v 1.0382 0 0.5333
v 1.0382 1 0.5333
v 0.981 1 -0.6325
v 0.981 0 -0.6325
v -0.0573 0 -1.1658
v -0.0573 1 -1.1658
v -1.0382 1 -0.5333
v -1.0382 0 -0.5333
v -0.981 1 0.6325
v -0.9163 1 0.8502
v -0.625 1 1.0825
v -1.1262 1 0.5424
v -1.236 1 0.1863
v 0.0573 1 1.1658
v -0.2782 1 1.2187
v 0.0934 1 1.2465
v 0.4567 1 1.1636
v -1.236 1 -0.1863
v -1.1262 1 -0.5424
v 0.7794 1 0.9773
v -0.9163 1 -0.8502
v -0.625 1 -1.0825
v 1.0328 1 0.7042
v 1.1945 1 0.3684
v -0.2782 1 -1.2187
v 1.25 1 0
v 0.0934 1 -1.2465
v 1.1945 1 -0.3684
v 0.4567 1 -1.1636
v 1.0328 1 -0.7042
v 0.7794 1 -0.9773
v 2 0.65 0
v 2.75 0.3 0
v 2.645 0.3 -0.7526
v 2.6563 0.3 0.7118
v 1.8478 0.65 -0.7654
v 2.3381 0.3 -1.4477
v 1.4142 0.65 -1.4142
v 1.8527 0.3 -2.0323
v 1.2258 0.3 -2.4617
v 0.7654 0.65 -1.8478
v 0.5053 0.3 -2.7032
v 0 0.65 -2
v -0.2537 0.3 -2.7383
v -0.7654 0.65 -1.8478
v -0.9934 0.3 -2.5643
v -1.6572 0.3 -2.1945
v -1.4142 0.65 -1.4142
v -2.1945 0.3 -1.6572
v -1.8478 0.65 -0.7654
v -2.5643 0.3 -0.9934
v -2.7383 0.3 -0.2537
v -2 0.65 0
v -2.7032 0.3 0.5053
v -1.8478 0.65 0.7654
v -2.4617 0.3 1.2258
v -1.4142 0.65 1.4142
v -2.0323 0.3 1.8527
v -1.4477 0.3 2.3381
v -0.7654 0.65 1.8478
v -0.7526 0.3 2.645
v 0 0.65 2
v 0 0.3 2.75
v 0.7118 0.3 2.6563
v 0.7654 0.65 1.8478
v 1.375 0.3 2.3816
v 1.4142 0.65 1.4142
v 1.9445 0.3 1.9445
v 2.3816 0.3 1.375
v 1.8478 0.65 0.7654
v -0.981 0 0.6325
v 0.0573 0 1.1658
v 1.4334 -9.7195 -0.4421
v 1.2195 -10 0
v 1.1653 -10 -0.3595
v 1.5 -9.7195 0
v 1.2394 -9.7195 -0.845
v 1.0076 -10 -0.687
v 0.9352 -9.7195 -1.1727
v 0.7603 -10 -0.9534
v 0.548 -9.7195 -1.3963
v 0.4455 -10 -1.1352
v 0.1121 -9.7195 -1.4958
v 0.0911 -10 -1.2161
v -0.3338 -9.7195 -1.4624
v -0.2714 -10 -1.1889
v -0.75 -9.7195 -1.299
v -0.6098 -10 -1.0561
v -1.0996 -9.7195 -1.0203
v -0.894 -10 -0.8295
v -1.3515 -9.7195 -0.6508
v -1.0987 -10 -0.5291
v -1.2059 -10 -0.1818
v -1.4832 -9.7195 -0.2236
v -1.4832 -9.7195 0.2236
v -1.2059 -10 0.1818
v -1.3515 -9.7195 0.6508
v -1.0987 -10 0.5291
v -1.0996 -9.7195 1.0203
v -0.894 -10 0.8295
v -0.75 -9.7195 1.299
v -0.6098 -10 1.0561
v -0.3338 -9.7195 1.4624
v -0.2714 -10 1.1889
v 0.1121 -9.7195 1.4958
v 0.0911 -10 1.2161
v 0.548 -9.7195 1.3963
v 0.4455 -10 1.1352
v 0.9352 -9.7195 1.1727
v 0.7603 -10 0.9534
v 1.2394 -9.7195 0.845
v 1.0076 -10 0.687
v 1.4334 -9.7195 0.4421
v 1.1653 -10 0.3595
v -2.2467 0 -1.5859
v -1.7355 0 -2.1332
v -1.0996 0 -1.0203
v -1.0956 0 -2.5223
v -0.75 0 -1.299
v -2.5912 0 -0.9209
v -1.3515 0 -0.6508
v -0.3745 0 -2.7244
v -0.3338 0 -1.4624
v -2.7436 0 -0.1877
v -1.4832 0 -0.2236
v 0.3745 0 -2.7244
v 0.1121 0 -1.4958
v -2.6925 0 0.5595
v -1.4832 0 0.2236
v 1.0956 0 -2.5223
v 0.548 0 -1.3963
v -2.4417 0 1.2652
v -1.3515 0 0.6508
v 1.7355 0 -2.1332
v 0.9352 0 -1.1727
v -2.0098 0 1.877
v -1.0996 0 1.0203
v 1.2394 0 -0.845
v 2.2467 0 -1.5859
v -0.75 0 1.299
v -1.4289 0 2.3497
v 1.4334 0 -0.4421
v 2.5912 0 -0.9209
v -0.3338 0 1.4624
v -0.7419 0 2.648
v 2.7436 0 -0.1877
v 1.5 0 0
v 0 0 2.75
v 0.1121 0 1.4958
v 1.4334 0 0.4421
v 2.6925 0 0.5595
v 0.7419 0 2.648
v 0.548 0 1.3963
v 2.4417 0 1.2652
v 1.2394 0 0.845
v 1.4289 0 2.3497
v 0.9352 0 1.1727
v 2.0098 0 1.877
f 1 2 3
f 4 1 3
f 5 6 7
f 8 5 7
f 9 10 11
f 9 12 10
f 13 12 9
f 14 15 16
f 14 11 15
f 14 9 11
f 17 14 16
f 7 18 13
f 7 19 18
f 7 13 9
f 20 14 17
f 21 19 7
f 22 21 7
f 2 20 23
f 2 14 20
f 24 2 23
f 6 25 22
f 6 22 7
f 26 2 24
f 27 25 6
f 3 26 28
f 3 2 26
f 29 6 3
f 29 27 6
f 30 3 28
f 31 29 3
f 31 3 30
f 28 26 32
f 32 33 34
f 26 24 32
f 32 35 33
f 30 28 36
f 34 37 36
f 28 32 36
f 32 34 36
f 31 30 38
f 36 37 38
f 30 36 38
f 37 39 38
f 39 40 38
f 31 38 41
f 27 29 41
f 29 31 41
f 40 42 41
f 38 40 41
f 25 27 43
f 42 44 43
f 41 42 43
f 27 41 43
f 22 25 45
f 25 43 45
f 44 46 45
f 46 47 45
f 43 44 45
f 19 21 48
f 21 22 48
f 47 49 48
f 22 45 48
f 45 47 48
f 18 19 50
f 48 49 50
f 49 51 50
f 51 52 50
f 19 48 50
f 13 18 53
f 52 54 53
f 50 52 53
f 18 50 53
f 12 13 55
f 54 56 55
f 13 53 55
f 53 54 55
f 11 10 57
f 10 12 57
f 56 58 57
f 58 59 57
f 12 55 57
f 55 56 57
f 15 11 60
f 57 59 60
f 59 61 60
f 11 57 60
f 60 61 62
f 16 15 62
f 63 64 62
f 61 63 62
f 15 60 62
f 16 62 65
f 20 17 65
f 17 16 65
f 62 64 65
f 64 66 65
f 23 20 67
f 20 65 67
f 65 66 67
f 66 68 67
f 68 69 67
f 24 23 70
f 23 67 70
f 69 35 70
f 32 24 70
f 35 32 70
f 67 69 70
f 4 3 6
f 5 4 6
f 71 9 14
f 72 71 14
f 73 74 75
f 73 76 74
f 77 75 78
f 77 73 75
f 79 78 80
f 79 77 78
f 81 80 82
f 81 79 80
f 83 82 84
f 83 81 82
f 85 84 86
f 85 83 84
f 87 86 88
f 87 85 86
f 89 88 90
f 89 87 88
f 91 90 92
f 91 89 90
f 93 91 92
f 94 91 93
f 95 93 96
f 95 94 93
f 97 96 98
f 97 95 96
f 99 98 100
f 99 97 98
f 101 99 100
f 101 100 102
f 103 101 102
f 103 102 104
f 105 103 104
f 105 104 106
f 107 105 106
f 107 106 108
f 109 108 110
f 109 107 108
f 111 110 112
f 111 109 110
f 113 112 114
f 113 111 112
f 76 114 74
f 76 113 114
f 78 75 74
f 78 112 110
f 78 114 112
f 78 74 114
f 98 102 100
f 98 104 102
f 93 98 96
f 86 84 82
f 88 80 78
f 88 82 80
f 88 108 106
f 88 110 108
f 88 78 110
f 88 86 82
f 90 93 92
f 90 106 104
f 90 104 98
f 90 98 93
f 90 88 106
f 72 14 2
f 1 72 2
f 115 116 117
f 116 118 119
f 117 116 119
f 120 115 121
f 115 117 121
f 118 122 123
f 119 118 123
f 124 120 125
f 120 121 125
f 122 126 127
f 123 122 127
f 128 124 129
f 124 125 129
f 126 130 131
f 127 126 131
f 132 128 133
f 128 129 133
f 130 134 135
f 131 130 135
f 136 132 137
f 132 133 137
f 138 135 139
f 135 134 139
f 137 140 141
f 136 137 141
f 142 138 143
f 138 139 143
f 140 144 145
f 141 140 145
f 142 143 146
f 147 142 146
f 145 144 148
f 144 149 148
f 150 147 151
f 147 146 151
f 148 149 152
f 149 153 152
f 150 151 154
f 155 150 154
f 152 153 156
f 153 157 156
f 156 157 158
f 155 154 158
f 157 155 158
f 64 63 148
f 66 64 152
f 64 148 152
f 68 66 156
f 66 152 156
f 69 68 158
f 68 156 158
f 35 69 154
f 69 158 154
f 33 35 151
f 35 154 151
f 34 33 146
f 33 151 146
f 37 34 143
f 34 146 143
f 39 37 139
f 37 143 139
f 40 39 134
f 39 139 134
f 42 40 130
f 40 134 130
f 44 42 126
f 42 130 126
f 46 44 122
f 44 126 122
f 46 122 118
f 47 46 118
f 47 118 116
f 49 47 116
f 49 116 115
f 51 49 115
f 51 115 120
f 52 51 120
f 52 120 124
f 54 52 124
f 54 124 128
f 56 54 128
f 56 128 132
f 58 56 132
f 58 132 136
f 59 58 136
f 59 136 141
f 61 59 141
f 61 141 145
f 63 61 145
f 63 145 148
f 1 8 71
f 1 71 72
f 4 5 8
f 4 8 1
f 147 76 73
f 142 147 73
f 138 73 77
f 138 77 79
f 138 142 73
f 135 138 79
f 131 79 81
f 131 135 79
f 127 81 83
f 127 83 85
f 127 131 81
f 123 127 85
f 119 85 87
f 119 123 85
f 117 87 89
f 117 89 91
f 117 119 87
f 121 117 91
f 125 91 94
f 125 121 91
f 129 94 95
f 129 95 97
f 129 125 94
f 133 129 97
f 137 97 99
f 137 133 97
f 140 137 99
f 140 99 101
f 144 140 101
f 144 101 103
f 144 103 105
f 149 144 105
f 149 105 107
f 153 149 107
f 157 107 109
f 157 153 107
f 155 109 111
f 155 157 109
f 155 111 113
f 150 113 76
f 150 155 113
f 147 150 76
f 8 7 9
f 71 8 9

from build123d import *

# Parameters (mm, degrees)
SKETCH1_R           = 2.75
BOSS_EXTRUDE1_DEPTH = 0.3
SKETCH2_R           = 1.25
CUT_EXTRUDE1_DEPTH  = 1


# Read off the part's stored shape, not the designer's step: M3x0.5 Machine Threads Stud1
with BuildPart() as part:
    # Sketch1 → Boss-Extrude1 (new body)
    with BuildSketch(Plane(origin=(0, 0, 0), x_dir=(1, 0, 0), z_dir=(0, 1, 0))):
        with Locations(Location((0, 0, 0), (0, 0, 270))):
            Circle(SKETCH1_R)
    extrude(amount=BOSS_EXTRUDE1_DEPTH)

    # Sketch2 → section 0 of loft1
    with BuildSketch(Plane(origin=(0, 1, 0), x_dir=(1, 0, 0), z_dir=(0, 1, 0)), mode=Mode.PRIVATE) as loft1_s0:
        Circle(SKETCH2_R)
    # loft up to a face of the part (loft1)
    loft([loft1_s0.sketch, Face(Wire([part.edges().sort_by_distance((2.004663725, 0.3, -1.882504541))[0]]))])

    # Sketch2<4> → Cut-Extrude1 (cut)
    with BuildSketch(Plane(origin=(0, 1, 0), x_dir=(1, 0, 0), z_dir=(0, 1, 0))):
        Polygon((-0.98095369, -0.632504307), (0.057287953, -1.165782969), (1.038241642, -0.533278662), (0.98095369, 0.632504307), (-0.057287953, 1.165782969), (-1.038241642, 0.533278662), align=None)
    extrude(amount=-CUT_EXTRUDE1_DEPTH, mode=Mode.SUBTRACT)

    # M3x0.5 Machine Threads Stud1 outline → M3x0.5 Machine Threads Stud1 (revolve)
    with BuildSketch(Plane.XY):
        Polygon((0, 0), (0, -10), (1.2195, -10), (1.5, -9.7195), (1.5, 0), align=None)
    revolve(axis=Axis((0, 0, 0), (0, 1, 0)))


solid = part.part
